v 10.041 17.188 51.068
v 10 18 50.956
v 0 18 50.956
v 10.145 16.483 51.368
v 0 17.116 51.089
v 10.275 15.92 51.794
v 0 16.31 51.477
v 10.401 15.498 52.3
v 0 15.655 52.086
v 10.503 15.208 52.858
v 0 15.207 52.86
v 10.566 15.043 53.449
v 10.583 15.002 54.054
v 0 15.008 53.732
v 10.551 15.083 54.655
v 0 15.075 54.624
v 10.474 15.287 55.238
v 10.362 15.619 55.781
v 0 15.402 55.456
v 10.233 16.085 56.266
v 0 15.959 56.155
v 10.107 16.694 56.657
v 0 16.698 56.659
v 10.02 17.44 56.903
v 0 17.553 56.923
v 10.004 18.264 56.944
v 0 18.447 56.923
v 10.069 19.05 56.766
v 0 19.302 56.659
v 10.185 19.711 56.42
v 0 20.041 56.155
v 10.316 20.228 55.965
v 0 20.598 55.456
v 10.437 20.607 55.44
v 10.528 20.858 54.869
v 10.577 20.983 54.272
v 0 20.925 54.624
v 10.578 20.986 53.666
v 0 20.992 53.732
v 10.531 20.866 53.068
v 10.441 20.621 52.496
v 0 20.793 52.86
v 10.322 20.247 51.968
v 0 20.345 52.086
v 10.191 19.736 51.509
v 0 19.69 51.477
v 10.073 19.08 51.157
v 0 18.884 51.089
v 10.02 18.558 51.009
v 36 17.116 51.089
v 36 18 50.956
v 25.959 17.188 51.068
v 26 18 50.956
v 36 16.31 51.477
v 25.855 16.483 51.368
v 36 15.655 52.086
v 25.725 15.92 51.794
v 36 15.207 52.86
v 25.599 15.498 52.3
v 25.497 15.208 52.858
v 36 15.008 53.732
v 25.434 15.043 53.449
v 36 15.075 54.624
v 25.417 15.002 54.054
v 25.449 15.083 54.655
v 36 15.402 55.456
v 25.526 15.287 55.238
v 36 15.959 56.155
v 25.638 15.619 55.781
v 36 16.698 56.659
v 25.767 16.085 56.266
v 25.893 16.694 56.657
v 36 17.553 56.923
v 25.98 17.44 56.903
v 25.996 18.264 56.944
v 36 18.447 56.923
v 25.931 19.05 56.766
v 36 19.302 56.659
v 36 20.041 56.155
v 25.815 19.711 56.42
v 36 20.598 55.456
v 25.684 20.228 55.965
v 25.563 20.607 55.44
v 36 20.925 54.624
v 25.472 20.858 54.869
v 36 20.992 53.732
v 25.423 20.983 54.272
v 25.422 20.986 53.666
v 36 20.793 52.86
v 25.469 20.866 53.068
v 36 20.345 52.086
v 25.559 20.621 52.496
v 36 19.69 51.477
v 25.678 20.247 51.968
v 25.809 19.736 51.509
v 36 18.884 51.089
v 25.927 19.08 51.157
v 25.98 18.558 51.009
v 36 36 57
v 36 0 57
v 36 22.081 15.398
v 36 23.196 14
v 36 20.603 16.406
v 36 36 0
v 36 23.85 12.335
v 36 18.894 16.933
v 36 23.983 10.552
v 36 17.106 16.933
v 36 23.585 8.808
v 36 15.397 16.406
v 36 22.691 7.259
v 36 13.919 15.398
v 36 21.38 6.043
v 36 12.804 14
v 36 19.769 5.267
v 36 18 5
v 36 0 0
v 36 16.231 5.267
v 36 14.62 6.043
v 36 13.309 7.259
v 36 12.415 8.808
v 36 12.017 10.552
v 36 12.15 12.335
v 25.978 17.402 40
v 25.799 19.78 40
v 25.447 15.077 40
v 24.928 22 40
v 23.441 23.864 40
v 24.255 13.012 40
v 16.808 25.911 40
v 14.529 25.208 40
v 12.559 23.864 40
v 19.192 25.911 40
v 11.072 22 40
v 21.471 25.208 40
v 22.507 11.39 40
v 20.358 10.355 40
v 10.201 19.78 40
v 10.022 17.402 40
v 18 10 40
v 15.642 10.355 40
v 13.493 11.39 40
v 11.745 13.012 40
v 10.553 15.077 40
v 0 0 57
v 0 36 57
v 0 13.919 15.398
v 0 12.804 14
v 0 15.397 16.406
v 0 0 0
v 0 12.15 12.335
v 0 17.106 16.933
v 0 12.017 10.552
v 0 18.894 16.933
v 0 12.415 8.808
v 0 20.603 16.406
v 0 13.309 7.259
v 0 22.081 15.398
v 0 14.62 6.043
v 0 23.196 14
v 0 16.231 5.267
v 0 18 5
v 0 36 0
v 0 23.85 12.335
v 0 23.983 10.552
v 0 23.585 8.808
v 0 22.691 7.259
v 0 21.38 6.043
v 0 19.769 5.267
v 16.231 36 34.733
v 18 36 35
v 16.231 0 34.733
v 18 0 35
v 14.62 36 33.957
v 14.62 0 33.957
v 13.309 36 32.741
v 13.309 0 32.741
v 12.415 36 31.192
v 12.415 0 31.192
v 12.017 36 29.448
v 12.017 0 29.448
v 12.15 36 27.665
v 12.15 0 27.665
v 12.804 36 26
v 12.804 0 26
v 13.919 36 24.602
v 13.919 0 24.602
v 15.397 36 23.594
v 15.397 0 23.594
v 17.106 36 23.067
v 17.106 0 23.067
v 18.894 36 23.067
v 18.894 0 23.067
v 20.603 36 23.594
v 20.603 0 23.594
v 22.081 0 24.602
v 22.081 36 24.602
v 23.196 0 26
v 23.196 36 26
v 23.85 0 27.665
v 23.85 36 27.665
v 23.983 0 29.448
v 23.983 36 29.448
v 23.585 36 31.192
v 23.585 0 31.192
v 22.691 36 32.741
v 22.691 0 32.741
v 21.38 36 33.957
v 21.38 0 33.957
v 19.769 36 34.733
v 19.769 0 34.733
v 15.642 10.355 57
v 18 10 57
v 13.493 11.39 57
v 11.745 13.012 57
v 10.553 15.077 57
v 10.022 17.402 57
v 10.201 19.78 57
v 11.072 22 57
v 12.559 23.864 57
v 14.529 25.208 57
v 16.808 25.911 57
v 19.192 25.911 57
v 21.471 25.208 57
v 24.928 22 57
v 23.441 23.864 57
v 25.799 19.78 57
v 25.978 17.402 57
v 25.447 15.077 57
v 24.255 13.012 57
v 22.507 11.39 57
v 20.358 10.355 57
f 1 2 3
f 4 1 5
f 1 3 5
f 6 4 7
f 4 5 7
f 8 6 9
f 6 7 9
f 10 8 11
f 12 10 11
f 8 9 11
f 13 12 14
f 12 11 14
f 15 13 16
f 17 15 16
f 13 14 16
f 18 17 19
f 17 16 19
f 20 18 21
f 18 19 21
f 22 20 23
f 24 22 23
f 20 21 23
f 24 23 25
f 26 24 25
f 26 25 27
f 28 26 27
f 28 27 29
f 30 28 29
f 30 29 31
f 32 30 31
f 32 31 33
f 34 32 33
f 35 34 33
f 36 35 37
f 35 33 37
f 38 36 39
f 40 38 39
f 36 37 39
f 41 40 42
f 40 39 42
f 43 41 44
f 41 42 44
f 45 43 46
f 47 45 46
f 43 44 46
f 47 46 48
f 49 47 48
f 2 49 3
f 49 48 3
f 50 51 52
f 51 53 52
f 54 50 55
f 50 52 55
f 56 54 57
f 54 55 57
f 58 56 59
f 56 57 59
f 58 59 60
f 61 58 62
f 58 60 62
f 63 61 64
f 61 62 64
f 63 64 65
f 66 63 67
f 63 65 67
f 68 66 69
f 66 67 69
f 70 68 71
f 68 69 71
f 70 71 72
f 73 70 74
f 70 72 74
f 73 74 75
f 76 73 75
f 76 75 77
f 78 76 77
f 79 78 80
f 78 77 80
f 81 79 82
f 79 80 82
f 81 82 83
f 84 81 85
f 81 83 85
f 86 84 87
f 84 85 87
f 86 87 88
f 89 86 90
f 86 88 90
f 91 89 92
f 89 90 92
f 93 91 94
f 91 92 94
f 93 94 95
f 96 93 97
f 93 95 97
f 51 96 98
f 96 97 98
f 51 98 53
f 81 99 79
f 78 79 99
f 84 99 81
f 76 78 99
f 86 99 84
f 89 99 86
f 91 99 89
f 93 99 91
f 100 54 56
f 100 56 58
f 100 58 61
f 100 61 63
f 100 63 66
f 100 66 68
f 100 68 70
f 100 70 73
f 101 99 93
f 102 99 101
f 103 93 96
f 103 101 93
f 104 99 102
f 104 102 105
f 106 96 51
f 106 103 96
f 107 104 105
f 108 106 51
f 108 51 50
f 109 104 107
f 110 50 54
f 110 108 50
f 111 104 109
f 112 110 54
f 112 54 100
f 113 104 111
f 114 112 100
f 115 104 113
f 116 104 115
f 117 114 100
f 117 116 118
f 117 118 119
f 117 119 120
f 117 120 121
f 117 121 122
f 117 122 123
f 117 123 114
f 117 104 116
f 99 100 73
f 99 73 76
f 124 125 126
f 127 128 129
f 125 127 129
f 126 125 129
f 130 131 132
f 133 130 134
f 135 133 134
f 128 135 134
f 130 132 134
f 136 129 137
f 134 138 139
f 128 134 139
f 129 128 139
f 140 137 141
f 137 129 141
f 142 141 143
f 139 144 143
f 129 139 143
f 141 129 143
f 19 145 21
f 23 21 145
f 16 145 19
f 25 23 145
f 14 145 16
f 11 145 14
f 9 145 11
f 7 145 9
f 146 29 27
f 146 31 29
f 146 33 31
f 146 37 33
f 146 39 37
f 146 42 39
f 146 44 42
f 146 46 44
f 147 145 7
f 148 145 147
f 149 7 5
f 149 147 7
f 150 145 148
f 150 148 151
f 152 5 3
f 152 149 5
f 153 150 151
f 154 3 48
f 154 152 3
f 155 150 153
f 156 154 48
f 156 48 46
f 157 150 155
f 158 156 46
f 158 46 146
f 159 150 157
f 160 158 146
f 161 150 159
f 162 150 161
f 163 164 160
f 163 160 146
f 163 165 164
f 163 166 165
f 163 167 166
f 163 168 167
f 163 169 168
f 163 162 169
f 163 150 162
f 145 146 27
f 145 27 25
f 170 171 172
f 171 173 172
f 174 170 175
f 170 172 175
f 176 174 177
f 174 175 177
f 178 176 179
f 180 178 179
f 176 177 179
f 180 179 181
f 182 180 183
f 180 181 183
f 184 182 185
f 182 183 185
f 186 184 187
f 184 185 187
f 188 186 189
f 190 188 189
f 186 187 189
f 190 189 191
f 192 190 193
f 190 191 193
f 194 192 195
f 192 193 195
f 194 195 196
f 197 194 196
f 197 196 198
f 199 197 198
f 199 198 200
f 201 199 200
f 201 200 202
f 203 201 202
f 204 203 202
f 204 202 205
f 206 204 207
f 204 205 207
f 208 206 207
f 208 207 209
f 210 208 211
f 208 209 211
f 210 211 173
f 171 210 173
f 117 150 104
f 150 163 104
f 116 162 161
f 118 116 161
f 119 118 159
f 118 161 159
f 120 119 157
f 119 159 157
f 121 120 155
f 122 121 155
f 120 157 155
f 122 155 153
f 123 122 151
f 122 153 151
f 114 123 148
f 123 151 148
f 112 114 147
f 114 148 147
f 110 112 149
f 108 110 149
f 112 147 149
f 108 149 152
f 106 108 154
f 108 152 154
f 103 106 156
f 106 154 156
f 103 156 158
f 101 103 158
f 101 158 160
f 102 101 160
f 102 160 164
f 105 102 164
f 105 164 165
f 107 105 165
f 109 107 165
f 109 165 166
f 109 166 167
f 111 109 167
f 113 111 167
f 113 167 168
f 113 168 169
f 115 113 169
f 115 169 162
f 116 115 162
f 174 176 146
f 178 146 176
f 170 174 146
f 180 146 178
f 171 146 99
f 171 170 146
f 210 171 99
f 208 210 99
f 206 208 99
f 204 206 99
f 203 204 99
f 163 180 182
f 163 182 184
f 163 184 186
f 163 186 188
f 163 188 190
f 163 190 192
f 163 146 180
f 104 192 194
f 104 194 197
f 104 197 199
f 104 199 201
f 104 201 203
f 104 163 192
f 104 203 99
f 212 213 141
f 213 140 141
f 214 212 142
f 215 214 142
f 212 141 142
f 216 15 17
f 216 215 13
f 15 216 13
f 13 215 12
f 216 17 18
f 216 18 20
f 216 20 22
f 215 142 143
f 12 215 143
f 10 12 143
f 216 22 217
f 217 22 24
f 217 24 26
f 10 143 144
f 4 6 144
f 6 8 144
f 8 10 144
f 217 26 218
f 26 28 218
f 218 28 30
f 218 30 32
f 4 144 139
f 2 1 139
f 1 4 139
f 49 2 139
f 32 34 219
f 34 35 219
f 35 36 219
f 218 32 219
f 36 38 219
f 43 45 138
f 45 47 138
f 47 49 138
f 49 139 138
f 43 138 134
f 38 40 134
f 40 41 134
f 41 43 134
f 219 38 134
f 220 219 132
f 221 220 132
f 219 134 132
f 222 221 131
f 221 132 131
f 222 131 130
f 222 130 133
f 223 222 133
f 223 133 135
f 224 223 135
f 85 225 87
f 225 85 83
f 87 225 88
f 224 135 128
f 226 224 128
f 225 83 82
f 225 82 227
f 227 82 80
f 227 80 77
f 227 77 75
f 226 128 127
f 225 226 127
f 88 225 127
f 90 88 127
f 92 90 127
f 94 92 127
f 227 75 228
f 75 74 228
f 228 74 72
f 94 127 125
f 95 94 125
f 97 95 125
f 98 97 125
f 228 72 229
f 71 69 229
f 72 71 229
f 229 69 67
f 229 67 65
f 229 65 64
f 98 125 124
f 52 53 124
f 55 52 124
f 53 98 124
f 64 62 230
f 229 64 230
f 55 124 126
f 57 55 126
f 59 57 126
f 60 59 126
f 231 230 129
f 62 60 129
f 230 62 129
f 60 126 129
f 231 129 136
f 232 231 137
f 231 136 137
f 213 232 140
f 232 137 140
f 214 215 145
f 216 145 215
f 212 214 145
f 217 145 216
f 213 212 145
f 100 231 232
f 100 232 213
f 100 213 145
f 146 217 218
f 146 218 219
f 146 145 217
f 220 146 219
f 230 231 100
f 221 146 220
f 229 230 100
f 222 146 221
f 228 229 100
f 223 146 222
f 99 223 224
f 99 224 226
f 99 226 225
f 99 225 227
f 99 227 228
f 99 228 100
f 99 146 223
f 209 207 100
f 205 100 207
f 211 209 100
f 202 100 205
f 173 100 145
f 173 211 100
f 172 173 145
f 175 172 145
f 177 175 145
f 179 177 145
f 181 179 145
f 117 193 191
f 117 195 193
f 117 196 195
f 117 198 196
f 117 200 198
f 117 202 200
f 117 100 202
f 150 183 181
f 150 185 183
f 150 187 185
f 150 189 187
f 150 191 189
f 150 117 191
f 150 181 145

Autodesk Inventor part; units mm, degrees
ref_plane "YZ Plane" through (0, 0, 0) normal (1, 0, 0) x (0, 1, 0)
ref_plane "XZ Plane" through (0, 0, 0) normal (0, 1, 0) x (-1, 0, 0)
ref_plane "XY Plane" through (0, 0, 0) normal (0, 0, 1) x (1, 0, 0)
sketch "Sketch1" plane through (0, 0, 0) normal (0, 0, 1) x (1, 0, 0)
  line L0 (0, 0) -> (0, 36)
  line L1 (0, 36) -> (36, 36)
  line L2 (36, 36) -> (36, 0)
  line L3 (36, 0) -> (0, 0)
  dimension "d0" = 36
  dimension "d1" = 36
extrude "Extrusion1" add sketch "Sketch1" along normal blind 57
sketch "Sketch2" plane through (0, 0, 57) normal (0, 0, 1) x (1, 0, 0)
  circle A0 centre (18, 18) radius 8
  dimension "d4" = 16
hole "Hole1" at (18, 18, 57) direction (0, 0, -1) diameter 16 depth 17
sketch "Sketch3" plane through (36, 0, 0) normal (1, 0, 0) x (0, 0, -1)
  circle A0 centre (-11, 18) radius 6
  dimension "d43" = 12
hole "Hole2" at (36, 18, 11) direction (-1, 0, 0) diameter 12 end through all
sketch "Sketch4" plane through (0, 36, 0) normal (0, 1, 0) x (1, 0, 0)
  circle A0 centre (18, -29) radius 6
  dimension "d46" = 12
hole "Hole3" at (18, 36, 29) direction (0, -1, 0) diameter 12 end through all
sketch "Sketch5" plane through (36, 0, 0) normal (1, 0, 0) x (0, 0, -1)
  circle A0 centre (-53.9561, 18) radius 3
  point P0 (0, 0)
  dimension "d41" = 6
hole "Hole4" at (36, 18, 53.9561) direction (-1, 0, 0) diameter 6 end through all
properties part number "Centerhoved" material "PC/ABS Plastic"
